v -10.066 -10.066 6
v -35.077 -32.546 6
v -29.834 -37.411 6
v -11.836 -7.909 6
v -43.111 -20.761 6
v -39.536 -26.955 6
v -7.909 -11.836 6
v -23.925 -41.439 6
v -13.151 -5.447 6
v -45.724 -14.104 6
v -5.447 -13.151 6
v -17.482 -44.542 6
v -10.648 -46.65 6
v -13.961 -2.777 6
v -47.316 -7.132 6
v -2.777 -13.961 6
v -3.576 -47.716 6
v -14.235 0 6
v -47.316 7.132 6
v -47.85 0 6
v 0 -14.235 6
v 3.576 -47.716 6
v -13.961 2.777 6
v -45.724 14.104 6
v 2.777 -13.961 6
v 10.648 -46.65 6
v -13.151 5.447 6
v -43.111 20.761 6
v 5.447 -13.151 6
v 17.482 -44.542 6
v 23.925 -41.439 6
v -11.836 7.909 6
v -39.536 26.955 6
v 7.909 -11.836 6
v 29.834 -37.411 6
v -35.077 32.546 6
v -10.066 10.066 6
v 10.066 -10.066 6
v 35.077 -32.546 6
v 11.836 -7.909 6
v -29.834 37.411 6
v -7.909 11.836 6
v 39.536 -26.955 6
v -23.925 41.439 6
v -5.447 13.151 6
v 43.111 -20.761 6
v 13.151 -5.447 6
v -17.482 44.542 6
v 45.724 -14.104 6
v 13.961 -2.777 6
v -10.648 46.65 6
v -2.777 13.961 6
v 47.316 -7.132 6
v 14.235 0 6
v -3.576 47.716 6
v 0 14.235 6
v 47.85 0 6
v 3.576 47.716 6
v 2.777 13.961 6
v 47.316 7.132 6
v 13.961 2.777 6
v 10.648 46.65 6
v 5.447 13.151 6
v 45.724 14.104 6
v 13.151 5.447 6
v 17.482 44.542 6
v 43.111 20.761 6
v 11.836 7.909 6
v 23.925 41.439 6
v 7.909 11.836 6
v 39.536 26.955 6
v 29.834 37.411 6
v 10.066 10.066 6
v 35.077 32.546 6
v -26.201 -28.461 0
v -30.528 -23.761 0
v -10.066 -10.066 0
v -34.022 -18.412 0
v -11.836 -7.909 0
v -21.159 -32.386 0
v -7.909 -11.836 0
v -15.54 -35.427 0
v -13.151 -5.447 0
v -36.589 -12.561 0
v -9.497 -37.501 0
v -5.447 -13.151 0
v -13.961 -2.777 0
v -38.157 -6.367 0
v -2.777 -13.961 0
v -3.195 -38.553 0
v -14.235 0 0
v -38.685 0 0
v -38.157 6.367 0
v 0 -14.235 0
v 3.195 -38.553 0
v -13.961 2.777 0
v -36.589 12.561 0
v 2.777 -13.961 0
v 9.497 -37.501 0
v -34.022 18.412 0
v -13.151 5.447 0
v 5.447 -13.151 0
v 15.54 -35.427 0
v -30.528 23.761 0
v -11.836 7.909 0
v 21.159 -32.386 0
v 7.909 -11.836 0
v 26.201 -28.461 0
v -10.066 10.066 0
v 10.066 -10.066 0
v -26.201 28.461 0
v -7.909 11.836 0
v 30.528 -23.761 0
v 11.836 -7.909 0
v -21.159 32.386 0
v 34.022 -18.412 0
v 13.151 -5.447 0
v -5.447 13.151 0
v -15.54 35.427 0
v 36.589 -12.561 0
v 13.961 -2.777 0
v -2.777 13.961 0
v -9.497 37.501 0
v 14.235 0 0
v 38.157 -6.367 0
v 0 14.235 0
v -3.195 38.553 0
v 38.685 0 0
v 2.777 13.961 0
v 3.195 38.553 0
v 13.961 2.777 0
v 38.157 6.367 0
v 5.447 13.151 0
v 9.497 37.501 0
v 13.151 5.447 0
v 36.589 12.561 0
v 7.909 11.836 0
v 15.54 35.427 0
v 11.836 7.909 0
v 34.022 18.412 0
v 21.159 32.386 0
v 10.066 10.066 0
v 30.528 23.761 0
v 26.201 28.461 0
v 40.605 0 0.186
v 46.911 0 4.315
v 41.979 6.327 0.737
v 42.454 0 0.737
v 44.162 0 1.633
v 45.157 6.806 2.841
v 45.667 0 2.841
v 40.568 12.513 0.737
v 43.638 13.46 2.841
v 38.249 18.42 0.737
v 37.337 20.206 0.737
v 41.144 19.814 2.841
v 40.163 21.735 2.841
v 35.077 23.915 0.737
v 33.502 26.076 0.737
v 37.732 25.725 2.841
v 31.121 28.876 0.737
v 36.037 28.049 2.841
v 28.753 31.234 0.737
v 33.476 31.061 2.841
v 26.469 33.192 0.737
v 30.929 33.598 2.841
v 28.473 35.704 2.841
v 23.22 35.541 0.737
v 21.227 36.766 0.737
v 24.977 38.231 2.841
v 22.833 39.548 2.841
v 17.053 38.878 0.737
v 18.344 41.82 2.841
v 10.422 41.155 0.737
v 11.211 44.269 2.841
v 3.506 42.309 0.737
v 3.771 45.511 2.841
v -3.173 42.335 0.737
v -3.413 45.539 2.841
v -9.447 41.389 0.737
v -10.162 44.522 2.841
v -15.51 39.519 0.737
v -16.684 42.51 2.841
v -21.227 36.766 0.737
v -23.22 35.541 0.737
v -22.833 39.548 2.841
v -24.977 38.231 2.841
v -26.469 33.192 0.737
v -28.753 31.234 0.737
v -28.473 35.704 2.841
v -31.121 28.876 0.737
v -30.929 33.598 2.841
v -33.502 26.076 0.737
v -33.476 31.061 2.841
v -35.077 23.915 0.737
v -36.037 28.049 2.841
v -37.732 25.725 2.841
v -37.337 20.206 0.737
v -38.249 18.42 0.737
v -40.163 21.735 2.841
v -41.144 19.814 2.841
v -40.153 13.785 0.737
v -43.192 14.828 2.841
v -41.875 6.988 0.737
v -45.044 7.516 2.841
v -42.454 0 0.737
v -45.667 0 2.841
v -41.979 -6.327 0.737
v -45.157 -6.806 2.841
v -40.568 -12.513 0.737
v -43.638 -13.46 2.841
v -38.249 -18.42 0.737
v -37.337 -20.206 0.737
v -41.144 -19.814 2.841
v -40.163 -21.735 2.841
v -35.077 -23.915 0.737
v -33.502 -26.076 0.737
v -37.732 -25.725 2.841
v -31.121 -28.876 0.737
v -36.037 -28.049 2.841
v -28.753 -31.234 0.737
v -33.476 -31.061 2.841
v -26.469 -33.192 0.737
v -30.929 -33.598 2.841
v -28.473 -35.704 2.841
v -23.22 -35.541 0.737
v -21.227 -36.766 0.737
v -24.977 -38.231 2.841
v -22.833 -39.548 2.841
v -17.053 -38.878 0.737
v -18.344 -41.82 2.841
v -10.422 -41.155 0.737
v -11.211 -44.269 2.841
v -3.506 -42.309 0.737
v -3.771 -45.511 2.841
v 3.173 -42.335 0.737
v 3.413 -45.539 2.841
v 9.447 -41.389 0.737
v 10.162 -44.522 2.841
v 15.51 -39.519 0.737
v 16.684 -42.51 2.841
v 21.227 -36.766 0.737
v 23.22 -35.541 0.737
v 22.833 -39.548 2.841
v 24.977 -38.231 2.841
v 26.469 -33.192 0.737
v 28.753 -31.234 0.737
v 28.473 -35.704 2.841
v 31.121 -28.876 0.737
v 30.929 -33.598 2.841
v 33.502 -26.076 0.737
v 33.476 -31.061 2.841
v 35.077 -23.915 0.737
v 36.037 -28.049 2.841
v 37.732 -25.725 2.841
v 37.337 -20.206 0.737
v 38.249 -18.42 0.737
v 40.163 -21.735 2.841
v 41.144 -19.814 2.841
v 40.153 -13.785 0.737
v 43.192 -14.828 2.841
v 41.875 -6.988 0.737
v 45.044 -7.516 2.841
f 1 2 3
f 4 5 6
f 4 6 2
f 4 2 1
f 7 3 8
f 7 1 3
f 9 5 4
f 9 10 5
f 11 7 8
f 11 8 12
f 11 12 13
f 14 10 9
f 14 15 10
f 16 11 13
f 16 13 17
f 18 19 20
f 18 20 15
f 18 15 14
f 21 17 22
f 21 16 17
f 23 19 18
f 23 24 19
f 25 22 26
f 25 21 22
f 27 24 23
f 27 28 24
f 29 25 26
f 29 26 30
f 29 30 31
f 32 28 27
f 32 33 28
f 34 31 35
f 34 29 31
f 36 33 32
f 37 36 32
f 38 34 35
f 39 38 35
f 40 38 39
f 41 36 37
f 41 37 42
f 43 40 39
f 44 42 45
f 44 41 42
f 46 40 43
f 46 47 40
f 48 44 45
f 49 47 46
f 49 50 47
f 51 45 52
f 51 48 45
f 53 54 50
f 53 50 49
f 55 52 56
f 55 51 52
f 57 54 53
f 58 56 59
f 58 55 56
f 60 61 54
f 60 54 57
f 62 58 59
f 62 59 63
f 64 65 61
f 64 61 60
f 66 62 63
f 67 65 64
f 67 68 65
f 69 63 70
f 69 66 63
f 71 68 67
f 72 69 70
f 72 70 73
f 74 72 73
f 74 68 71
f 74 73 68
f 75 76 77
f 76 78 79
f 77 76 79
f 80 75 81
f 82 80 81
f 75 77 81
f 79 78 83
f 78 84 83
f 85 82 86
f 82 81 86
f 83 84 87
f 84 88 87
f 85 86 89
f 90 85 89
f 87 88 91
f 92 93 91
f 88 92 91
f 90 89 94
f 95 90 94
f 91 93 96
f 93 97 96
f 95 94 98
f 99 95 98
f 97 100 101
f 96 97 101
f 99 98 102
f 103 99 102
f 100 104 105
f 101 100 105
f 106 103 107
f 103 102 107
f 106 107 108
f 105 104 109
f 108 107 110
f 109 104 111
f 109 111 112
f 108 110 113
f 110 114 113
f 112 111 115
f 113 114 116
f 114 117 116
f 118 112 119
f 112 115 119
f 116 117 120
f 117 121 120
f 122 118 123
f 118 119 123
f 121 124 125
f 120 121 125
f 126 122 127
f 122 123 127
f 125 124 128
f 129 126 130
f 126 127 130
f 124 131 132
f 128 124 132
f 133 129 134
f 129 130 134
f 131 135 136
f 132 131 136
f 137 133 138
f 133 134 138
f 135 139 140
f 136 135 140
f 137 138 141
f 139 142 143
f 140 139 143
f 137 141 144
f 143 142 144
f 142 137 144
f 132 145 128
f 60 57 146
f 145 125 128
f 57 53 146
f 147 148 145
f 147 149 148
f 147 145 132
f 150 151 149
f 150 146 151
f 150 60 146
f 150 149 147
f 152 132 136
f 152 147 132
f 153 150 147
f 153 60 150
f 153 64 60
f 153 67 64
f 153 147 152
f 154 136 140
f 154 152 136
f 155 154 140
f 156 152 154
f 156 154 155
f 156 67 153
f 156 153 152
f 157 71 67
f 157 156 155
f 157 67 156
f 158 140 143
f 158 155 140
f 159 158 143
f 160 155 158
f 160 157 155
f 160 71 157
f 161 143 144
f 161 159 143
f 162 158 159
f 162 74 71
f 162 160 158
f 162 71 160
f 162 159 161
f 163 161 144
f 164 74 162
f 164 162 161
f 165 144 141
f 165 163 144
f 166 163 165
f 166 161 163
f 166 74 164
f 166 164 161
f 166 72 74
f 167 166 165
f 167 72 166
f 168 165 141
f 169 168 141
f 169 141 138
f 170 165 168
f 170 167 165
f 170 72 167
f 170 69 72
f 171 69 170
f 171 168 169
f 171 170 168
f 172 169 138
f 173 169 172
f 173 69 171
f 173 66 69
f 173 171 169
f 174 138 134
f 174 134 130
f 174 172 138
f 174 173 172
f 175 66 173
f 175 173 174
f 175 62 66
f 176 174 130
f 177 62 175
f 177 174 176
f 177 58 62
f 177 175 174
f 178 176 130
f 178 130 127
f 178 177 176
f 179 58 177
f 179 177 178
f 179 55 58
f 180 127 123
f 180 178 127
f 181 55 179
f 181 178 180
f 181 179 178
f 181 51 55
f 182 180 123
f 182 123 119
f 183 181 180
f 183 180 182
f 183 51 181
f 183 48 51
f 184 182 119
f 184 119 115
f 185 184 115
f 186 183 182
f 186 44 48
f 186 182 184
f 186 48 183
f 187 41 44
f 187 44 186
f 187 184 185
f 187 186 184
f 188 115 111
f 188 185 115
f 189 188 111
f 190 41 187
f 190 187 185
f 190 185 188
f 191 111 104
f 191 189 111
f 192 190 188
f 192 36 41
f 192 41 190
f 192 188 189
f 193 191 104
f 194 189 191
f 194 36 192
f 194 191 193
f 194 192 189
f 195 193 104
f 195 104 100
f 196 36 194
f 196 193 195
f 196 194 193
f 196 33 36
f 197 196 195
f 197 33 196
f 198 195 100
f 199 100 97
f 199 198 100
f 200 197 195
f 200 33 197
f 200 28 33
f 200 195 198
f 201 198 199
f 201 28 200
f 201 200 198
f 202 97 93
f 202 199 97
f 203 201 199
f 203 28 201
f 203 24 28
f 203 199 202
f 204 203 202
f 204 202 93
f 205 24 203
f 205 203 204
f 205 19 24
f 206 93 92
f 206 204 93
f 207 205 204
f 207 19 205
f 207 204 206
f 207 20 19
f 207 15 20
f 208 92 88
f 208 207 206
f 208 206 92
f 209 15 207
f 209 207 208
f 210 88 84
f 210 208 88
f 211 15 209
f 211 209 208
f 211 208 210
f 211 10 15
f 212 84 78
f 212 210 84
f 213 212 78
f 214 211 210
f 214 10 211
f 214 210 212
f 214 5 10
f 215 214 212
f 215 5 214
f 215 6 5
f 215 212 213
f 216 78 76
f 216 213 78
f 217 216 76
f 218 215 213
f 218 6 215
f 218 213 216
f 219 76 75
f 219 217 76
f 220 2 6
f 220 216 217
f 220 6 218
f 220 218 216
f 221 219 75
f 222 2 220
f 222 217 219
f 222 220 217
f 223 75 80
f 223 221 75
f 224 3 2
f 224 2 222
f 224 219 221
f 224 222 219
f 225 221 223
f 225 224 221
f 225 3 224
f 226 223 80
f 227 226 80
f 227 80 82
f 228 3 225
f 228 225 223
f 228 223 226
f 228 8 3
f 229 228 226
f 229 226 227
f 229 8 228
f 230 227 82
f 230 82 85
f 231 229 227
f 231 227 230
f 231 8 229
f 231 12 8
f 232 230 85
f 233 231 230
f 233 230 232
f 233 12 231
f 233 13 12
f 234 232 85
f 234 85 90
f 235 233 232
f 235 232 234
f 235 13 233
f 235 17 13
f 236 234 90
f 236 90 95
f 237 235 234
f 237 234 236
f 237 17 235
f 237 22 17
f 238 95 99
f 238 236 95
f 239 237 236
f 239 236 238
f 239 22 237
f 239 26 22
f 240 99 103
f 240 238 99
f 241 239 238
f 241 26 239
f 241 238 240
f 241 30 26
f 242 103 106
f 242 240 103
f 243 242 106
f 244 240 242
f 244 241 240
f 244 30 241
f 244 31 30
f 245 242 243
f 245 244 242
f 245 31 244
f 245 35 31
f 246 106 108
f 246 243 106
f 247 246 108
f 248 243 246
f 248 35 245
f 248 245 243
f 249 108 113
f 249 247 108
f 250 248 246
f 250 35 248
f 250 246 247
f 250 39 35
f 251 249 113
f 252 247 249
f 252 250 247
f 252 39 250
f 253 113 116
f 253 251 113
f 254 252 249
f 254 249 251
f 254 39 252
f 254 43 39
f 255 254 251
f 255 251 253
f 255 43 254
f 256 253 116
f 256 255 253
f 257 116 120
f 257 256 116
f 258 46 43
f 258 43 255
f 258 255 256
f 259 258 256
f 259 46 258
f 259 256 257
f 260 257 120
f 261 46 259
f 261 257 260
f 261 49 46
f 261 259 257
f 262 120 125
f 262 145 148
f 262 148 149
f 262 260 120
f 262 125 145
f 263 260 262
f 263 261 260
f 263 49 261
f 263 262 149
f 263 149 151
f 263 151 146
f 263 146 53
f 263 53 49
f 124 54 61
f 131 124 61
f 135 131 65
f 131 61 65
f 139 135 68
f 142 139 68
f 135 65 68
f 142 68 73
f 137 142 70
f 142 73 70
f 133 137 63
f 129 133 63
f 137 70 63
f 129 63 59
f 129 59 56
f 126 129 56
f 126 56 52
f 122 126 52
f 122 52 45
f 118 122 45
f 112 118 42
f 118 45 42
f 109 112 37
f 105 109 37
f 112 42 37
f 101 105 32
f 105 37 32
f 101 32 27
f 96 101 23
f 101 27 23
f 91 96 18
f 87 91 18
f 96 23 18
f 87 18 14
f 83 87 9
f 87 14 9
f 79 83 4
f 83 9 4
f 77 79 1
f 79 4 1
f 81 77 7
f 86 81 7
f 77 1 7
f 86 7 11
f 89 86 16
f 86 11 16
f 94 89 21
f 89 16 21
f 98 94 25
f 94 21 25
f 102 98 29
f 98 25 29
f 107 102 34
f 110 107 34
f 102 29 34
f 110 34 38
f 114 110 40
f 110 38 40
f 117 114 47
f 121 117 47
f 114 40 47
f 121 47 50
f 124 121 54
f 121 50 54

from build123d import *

# Parameters (mm, degrees)
SKETCH1_R           = 47.85
BOSS_EXTRUDE1_DEPTH = 6
SKETCH2_R           = 14.235
CUT_EXTRUDE1_DEPTH  = 6
FILLET2_R           = 10


with BuildPart() as part:
    # Sketch1 → Boss-Extrude1 (new body)
    with BuildSketch(Plane.XY):
        Circle(SKETCH1_R)
    extrude(amount=BOSS_EXTRUDE1_DEPTH)

    # Sketch2 → Cut-Extrude1 (cut)
    with BuildSketch(Plane.XY.offset(6)):
        Circle(SKETCH2_R)
    extrude(amount=-CUT_EXTRUDE1_DEPTH, mode=Mode.SUBTRACT)

    # Fillet2
    # the kernel refuses this fillet: 10 mm, written as the material it takes off along each edge
    with BuildSketch(Plane(origin=(0, 0, 0), x_dir=(1, 0, 0), z_dir=(0, -1, 0))) as fillet2_piece_1:
        with BuildLine():
            CenterArc((38.68484861, 10), FILLET2_R, 270, 66.421821522)
            Line((38.68484861, 0), (38.68484861, -0.2))
            Line((38.68484861, -0.2), (47.85, -0.2))
            Line((47.85, -0.2), (48.05, 0))
            ThreePointArc((48.05, 0), (48.05, 3), (48.033303028, 5.92))
            Line((48.033303028, 5.92), (47.85, 6))
        make_face()
    revolve(axis=Axis((0, 0, 0), (0, 0, 1)), mode=Mode.SUBTRACT)


solid = part.part
